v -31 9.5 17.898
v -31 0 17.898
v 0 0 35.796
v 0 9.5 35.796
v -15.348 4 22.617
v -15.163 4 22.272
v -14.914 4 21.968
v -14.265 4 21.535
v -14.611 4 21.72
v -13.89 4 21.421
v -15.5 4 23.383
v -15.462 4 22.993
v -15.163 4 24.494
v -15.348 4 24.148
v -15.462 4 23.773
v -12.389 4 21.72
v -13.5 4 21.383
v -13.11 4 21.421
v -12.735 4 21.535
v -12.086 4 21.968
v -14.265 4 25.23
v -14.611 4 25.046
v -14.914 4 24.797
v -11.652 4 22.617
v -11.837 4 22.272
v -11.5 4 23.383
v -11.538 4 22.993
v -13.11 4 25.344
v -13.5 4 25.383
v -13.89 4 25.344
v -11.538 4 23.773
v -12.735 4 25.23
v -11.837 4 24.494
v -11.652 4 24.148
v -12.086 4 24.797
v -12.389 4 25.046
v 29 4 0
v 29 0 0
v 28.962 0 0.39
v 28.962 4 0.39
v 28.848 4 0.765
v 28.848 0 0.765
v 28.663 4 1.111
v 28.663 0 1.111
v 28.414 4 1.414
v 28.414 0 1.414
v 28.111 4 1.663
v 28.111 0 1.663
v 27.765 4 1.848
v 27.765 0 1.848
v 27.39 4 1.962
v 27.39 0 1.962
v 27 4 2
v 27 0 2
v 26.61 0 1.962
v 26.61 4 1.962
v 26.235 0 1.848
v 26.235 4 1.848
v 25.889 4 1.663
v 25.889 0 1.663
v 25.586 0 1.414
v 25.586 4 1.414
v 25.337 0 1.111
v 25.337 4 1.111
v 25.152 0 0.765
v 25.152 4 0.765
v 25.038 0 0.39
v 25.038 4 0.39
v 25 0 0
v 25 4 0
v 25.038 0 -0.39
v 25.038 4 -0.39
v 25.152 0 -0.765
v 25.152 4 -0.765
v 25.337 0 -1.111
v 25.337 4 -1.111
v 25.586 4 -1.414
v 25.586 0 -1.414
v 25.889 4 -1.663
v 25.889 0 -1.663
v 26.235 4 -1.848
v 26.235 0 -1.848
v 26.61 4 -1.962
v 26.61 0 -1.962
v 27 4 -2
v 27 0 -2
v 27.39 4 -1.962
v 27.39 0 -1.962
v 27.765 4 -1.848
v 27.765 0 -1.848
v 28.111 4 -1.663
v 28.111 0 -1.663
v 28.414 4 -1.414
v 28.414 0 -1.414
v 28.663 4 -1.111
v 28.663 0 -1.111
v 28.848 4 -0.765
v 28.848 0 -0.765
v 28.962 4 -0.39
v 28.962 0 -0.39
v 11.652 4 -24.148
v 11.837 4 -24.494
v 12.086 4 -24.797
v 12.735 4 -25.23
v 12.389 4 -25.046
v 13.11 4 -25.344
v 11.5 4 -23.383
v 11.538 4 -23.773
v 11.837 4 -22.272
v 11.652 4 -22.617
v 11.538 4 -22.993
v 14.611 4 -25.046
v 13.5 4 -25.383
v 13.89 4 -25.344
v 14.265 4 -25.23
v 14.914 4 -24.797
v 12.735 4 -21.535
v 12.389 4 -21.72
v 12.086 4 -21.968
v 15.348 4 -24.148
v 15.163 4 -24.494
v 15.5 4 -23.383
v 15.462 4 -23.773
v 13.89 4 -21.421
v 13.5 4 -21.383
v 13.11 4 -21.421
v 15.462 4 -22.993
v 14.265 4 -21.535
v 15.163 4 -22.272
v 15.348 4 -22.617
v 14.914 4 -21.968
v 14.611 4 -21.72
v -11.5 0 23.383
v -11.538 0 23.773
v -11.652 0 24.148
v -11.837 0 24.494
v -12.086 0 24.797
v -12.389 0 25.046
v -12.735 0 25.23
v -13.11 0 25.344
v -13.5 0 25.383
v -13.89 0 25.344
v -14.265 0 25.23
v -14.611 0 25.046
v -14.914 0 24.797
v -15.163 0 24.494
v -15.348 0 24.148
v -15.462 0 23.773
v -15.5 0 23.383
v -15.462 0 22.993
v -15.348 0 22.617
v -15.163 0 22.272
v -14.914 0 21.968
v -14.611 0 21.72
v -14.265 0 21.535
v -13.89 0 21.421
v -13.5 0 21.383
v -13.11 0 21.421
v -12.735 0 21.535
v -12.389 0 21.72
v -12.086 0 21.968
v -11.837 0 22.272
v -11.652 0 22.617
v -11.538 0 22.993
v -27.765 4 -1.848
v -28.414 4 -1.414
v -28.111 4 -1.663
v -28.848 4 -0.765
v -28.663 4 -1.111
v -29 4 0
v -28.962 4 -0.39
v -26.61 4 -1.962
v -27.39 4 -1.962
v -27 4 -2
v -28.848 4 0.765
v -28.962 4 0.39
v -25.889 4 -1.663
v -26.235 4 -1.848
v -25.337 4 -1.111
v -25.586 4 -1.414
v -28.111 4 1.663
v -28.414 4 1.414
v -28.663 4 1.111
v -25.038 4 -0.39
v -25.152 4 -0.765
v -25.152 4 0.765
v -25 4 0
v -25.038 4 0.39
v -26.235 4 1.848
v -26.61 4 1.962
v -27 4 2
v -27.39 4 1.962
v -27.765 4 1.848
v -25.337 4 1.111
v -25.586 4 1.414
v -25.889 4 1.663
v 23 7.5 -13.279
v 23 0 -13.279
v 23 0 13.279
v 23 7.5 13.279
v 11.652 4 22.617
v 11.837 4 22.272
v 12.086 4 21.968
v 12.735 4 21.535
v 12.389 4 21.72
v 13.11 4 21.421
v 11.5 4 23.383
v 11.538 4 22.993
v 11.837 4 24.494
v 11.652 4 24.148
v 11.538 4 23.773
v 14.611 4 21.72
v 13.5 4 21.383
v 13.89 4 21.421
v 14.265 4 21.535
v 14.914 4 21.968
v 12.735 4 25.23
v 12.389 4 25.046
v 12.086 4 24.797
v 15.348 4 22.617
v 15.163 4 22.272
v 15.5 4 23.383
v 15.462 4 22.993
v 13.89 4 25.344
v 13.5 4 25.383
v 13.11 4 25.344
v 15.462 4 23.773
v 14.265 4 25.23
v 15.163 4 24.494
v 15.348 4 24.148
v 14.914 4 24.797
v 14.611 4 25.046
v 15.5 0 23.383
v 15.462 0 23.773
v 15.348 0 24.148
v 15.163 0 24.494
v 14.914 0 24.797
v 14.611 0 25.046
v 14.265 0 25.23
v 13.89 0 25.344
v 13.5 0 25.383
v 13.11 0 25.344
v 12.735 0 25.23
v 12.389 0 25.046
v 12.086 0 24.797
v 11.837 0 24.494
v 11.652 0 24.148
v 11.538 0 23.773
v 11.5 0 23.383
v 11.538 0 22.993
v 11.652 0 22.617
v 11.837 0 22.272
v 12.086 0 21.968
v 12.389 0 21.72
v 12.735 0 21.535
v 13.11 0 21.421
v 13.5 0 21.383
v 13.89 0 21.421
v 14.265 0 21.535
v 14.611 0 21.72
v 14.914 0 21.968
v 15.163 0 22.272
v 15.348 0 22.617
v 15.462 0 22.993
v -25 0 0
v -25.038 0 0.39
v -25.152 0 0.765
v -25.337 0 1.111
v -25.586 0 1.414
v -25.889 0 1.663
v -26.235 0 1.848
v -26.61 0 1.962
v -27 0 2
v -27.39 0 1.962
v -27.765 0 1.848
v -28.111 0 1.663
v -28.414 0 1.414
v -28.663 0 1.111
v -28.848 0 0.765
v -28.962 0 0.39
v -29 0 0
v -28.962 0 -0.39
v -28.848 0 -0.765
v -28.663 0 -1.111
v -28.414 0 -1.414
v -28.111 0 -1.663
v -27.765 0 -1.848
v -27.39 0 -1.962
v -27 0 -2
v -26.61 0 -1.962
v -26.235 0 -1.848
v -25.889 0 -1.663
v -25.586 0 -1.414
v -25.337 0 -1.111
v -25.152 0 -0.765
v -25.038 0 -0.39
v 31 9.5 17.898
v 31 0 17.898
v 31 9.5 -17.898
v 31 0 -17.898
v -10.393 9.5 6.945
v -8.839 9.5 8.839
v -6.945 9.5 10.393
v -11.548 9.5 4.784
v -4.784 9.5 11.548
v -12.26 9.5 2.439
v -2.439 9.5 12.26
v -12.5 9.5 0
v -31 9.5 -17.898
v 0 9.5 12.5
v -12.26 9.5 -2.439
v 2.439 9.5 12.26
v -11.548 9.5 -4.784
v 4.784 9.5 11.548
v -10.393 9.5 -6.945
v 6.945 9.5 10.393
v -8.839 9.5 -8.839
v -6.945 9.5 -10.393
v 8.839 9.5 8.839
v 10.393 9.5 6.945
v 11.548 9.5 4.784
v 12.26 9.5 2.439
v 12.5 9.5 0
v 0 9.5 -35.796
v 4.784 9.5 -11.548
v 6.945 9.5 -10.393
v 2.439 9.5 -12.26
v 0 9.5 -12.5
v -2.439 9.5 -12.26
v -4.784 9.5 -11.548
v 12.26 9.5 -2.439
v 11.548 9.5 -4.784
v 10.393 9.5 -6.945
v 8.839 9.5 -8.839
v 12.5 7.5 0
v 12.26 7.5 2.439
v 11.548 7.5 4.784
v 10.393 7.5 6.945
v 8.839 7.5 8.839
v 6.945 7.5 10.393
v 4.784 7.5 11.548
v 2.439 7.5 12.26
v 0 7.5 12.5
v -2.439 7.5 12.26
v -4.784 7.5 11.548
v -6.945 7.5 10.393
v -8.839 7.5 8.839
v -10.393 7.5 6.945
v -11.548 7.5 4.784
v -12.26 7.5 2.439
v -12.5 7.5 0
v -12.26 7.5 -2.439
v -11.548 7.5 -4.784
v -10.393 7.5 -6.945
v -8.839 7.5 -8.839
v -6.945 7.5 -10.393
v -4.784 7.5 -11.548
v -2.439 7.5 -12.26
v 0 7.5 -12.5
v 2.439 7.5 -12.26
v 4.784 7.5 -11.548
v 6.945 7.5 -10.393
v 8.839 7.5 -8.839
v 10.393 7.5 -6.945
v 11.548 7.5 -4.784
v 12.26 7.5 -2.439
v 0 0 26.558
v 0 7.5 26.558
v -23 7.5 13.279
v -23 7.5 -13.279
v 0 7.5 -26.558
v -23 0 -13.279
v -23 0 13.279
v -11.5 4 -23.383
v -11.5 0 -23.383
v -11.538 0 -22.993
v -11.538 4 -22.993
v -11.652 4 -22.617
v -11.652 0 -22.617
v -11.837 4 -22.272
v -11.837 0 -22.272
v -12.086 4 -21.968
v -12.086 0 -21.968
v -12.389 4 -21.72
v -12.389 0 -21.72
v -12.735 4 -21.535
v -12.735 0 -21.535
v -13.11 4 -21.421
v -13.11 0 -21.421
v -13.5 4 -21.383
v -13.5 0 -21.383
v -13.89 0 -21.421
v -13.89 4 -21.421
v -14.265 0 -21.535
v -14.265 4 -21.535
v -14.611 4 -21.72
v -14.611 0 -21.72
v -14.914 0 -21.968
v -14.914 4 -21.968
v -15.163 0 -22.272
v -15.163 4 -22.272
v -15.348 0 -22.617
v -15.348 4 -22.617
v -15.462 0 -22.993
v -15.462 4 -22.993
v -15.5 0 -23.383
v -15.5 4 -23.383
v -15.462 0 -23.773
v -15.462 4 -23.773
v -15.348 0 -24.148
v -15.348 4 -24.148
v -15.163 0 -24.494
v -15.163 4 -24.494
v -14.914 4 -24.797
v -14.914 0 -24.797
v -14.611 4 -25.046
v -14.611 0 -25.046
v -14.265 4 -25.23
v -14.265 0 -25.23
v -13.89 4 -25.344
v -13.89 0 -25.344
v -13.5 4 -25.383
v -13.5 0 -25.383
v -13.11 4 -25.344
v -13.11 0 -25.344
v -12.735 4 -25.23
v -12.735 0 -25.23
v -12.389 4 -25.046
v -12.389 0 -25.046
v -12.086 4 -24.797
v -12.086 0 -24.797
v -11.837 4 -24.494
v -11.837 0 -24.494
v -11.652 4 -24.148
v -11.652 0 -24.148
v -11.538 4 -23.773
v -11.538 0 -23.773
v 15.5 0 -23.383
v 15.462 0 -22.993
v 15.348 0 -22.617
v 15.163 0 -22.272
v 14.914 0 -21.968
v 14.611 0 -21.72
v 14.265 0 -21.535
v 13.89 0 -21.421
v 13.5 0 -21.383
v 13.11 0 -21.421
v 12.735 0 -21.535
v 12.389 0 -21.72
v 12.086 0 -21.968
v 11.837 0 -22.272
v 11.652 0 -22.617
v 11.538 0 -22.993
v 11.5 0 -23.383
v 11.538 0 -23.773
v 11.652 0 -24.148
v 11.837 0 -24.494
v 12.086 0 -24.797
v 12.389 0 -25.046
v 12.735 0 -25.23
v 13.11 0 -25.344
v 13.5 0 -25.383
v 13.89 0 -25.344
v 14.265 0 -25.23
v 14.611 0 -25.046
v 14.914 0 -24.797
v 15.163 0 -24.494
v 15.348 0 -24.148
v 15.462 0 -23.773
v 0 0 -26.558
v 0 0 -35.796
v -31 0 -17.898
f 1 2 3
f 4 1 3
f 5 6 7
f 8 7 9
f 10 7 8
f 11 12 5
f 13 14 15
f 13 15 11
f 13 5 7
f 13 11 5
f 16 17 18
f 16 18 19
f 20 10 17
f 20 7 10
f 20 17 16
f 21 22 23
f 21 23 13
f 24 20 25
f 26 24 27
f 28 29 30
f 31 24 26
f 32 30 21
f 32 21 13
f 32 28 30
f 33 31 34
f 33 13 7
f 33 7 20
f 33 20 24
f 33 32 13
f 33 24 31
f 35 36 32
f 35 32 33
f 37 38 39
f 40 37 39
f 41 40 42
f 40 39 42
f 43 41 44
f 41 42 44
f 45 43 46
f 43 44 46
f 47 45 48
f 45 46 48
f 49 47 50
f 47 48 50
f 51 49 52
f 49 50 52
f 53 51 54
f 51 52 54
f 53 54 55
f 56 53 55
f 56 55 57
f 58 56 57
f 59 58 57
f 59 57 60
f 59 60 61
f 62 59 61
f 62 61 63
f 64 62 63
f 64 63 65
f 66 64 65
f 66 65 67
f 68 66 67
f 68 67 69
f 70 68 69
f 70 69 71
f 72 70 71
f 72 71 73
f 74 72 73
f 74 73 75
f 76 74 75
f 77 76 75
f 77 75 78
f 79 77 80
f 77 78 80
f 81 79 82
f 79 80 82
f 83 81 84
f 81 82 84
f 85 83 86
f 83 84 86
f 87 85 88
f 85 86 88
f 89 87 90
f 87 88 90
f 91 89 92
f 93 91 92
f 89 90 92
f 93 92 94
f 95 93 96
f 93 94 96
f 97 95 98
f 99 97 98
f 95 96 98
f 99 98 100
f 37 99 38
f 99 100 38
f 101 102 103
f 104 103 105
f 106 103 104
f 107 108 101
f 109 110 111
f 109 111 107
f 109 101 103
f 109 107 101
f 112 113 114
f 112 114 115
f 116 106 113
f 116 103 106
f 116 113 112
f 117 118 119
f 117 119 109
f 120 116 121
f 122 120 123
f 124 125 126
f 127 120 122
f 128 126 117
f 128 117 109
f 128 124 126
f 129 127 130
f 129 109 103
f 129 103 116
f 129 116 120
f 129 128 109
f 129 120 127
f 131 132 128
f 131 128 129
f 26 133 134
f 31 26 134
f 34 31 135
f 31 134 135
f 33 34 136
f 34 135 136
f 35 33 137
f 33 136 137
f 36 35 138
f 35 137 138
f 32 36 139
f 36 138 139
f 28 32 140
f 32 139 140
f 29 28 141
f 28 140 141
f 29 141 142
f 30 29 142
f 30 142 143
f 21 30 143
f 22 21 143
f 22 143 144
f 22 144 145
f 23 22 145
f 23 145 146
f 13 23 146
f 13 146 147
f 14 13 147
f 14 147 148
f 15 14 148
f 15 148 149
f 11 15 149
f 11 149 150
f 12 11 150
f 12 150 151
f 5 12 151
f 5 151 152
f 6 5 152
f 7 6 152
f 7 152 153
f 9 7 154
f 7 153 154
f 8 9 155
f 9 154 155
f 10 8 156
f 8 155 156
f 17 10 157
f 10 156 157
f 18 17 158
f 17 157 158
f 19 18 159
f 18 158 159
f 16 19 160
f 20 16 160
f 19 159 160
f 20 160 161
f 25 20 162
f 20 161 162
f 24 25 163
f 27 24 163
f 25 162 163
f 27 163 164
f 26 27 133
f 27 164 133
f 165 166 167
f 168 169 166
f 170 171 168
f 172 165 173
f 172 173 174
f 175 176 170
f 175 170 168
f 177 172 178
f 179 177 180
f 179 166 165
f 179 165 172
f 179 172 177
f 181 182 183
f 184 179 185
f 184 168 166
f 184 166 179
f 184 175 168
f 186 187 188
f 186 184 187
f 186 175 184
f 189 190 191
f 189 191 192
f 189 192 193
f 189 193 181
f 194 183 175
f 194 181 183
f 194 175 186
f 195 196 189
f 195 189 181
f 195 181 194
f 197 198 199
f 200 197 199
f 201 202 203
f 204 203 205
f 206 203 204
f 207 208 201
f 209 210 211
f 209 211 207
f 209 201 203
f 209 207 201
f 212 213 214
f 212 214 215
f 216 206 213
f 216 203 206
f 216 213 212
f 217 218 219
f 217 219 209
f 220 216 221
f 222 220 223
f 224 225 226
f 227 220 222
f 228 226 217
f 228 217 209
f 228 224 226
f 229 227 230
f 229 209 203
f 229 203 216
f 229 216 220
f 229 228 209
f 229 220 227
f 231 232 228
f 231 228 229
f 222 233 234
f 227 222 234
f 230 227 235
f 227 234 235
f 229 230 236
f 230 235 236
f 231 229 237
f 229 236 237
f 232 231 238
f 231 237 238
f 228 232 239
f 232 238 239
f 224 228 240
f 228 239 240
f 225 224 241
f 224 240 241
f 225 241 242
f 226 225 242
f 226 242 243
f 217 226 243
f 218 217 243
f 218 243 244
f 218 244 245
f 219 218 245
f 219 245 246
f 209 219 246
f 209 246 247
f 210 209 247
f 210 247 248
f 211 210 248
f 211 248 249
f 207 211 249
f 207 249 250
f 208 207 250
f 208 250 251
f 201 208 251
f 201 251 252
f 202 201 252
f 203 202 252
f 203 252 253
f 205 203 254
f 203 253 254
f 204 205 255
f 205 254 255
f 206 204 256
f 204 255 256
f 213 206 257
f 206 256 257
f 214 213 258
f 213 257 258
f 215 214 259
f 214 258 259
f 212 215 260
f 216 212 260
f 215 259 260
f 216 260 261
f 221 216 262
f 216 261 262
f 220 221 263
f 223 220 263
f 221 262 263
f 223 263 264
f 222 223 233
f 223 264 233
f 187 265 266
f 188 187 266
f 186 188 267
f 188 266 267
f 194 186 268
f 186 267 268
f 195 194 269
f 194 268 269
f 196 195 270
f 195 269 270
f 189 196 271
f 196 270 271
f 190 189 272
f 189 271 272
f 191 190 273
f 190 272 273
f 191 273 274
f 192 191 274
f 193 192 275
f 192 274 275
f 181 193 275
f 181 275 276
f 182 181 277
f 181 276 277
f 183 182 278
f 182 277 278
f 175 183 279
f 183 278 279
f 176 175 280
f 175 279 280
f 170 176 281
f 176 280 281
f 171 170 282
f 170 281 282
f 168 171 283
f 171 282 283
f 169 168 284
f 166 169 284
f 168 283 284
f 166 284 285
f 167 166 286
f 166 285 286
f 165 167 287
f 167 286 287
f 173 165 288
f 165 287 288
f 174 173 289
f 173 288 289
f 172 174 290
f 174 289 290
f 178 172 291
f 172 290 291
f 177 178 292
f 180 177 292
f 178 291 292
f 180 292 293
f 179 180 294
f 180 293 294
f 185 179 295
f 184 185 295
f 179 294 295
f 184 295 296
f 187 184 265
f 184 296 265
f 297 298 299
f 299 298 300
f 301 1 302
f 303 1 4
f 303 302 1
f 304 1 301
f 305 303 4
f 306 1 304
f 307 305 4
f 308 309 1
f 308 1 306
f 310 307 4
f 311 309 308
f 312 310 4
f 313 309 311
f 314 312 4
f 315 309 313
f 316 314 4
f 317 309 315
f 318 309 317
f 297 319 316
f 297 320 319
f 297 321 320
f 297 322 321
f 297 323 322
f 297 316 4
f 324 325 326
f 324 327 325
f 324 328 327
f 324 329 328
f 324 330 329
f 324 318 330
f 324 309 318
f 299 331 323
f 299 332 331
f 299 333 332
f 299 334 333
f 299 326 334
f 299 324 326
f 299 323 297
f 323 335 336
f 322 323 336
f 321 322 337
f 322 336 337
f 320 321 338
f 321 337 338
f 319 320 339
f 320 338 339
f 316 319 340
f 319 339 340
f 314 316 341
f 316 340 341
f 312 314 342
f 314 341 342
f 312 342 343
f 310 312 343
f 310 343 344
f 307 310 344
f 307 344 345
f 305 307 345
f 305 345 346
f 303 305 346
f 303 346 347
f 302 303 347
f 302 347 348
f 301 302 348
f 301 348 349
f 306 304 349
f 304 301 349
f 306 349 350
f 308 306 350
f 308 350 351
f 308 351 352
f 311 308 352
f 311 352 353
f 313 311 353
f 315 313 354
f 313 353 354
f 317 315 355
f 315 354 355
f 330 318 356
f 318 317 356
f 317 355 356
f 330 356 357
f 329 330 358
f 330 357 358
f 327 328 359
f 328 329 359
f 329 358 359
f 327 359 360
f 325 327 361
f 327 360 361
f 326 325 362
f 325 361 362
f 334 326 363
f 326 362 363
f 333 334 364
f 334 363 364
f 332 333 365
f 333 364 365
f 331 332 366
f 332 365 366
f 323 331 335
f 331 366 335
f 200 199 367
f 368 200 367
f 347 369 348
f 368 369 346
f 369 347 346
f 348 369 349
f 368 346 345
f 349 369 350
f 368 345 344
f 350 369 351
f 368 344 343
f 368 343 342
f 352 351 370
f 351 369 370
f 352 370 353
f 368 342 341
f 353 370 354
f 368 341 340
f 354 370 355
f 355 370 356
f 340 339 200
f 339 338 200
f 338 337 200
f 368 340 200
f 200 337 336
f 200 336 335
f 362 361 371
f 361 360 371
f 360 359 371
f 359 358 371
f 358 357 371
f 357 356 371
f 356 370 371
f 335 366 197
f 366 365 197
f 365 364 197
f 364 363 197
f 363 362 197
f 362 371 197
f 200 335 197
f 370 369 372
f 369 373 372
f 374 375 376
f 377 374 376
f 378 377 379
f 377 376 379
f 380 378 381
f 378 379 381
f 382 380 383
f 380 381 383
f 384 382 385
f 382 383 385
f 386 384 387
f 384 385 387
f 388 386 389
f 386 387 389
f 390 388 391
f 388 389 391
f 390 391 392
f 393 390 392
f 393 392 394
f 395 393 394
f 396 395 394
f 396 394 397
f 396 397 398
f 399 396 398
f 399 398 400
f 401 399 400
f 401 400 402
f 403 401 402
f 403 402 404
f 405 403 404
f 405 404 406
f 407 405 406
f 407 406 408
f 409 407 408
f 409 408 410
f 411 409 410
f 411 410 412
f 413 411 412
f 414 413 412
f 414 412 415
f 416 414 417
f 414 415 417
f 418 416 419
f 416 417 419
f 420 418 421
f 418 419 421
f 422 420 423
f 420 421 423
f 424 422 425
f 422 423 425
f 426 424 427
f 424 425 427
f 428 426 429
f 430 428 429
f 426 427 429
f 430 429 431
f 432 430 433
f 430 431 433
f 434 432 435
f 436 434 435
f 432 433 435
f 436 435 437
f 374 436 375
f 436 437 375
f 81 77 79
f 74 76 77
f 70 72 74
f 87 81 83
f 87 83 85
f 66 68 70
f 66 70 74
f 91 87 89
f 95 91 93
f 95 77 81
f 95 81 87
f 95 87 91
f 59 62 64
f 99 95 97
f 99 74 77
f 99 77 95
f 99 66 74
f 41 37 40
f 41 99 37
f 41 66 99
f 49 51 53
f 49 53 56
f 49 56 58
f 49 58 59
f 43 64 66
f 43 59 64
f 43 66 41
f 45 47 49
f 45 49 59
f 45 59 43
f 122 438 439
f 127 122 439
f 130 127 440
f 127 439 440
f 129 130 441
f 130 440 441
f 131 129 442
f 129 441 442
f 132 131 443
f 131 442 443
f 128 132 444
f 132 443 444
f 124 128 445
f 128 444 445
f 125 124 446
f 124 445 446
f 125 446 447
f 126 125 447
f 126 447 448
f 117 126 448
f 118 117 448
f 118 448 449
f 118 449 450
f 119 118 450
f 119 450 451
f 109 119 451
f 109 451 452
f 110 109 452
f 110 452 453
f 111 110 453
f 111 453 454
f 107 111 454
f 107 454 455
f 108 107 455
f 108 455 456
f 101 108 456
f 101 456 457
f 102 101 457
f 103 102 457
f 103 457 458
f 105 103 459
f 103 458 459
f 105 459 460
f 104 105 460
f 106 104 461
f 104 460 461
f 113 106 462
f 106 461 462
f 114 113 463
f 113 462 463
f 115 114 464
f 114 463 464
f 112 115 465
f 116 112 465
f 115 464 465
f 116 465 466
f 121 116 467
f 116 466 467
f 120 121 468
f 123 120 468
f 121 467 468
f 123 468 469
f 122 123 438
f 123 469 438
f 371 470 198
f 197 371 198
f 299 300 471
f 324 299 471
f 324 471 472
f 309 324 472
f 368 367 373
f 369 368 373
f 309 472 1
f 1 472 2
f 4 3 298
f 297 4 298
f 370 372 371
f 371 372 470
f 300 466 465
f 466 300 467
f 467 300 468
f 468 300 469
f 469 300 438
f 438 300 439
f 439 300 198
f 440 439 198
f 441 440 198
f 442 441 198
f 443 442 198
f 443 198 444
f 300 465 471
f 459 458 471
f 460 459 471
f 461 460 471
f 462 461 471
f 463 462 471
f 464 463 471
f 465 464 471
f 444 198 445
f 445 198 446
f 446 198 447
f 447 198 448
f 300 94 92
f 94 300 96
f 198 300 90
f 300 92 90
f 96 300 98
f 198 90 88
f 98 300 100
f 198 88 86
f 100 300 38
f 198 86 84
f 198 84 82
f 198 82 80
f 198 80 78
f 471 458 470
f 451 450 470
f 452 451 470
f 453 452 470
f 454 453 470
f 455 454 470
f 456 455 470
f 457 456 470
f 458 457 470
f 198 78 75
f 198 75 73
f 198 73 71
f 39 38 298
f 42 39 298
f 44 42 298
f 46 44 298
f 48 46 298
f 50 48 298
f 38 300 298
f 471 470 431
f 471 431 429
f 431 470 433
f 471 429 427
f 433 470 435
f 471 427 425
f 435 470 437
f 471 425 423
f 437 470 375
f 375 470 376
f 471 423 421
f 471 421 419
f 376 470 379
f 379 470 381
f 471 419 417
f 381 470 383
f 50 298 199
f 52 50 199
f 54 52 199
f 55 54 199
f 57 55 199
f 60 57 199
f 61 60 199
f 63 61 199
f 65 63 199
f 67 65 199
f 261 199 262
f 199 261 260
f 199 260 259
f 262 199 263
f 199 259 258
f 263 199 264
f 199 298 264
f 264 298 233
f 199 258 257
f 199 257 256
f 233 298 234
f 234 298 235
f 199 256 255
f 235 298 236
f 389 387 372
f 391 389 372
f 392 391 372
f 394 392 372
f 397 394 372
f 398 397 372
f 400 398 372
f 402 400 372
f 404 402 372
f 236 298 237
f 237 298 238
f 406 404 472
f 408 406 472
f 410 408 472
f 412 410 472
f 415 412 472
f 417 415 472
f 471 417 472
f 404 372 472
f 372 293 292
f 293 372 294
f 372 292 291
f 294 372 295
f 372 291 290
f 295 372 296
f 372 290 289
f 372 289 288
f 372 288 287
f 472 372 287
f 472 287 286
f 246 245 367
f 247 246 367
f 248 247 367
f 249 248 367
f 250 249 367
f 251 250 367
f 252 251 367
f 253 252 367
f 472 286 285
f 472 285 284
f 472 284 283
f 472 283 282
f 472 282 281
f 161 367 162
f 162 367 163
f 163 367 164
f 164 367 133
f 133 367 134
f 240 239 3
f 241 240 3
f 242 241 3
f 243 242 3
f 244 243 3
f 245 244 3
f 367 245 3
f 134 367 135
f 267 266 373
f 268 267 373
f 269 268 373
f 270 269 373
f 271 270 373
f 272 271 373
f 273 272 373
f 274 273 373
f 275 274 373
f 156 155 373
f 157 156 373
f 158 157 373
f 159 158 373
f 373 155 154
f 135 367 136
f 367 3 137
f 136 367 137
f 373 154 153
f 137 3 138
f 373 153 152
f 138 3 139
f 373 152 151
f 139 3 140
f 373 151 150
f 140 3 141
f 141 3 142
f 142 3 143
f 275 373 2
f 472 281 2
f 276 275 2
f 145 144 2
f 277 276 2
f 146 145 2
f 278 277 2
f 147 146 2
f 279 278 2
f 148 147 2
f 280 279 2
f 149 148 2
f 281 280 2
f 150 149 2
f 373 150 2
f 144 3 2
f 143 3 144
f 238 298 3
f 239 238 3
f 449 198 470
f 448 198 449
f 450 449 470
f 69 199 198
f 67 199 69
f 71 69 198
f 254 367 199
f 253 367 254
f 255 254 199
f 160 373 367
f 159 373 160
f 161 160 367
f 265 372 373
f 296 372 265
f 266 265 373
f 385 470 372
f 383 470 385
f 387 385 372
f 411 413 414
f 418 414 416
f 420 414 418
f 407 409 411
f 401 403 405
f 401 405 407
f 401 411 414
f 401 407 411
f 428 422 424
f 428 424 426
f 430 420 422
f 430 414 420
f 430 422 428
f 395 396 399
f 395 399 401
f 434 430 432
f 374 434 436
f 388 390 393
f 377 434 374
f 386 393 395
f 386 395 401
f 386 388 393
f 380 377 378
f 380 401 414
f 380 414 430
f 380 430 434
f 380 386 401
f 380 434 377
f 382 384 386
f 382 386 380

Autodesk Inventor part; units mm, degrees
ref_plane "YZ Plane" through (0, 0, 0) normal (1, 0, 0) x (0, 1, 0)
ref_plane "XZ Plane" through (0, 0, 0) normal (0, 1, 0) x (-1, 0, 0)
ref_plane "XY Plane" through (0, 0, 0) normal (0, 0, 1) x (1, 0, 0)
sketch "Эскиз1" plane through (0, 0, 0) normal (0, 1, 0) x (-1, 0, 0)
  line L0 (-23, 13.2791) -> (0, 26.5581)
  line L1 (0, 26.5581) -> (23, 13.2791)
  line L2 (23, 13.2791) -> (23, -13.2791)
  line L3 (23, -13.2791) -> (0, -26.5581)
  line L4 (0, -26.5581) -> (-23, -13.2791)
  line L5 (-23, -13.2791) -> (-23, 13.2791)
  line L6 (0, 0) -> (15.979, 0)
  line L7 (0, 0) -> (15.979, 0) construction
  line L8 (31, -17.8979) -> (31, 17.8979)
  line L9 (31, 17.8979) -> (0, 35.7957)
  line L10 (0, 35.7957) -> (-31, 17.8979)
  line L11 (-31, 17.8979) -> (-31, -17.8979)
  line L12 (-31, -17.8979) -> (0, -35.7957)
  line L13 (0, -35.7957) -> (31, -17.8979)
  dimension "d2" = 46
  dimension "d3" = 8
extrude "Выдавливание1" add sketch "Эскиз1" along normal blind 7.5
sketch "Эскиз2" plane through (0, 7.5, 0) normal (0, 1, 0) x (1, 0, 0)
  line L0 (31, -17.8979) -> (31, 17.8979) projected
  line L1 (31, 17.8979) -> (31, -17.8979)
  line L2 (31, -17.8979) -> (0, -35.7957)
  line L3 (0, -35.7957) -> (-31, -17.8979)
  line L4 (-31, -17.8979) -> (-31, 17.8979)
  line L5 (-31, 17.8979) -> (0, 35.7957)
  line L6 (0, 35.7957) -> (31, 17.8979)
  circle A0 centre (0, 0) radius 12.5
  point P0 (31, -17.8979)
  dimension "d6" = 25
extrude "Выдавливание2" add sketch "Эскиз2" along normal blind 2
sketch "Эскиз3" plane through (0, 0, 0) normal (0, -1, 0) x (1, 0, 0)
  line L0 (0, 35.7957) -> (31, 17.8979) construction
  line L1 (15.5, 26.8468) -> (11.5, 19.9186) construction
  line L2 (23, 13.2791) -> (0, 26.5581) construction
  circle A0 centre (13.5, 23.3827) radius 2
  circle A1 centre (0, 0) radius 27 construction
  circle A2 centre (-13.5, 23.3827) radius 2
  circle A3 centre (-27, 0) radius 2
  circle A4 centre (-13.5, -23.3827) radius 2
  circle A5 centre (13.5, -23.3827) radius 2
  circle A6 centre (27, 0) radius 2
  dimension "d9" = 4
  dimension "d12" = 360
extrude "Выдавливание3" cut sketch "Эскиз3" against normal blind 4
properties part number "держатель"
